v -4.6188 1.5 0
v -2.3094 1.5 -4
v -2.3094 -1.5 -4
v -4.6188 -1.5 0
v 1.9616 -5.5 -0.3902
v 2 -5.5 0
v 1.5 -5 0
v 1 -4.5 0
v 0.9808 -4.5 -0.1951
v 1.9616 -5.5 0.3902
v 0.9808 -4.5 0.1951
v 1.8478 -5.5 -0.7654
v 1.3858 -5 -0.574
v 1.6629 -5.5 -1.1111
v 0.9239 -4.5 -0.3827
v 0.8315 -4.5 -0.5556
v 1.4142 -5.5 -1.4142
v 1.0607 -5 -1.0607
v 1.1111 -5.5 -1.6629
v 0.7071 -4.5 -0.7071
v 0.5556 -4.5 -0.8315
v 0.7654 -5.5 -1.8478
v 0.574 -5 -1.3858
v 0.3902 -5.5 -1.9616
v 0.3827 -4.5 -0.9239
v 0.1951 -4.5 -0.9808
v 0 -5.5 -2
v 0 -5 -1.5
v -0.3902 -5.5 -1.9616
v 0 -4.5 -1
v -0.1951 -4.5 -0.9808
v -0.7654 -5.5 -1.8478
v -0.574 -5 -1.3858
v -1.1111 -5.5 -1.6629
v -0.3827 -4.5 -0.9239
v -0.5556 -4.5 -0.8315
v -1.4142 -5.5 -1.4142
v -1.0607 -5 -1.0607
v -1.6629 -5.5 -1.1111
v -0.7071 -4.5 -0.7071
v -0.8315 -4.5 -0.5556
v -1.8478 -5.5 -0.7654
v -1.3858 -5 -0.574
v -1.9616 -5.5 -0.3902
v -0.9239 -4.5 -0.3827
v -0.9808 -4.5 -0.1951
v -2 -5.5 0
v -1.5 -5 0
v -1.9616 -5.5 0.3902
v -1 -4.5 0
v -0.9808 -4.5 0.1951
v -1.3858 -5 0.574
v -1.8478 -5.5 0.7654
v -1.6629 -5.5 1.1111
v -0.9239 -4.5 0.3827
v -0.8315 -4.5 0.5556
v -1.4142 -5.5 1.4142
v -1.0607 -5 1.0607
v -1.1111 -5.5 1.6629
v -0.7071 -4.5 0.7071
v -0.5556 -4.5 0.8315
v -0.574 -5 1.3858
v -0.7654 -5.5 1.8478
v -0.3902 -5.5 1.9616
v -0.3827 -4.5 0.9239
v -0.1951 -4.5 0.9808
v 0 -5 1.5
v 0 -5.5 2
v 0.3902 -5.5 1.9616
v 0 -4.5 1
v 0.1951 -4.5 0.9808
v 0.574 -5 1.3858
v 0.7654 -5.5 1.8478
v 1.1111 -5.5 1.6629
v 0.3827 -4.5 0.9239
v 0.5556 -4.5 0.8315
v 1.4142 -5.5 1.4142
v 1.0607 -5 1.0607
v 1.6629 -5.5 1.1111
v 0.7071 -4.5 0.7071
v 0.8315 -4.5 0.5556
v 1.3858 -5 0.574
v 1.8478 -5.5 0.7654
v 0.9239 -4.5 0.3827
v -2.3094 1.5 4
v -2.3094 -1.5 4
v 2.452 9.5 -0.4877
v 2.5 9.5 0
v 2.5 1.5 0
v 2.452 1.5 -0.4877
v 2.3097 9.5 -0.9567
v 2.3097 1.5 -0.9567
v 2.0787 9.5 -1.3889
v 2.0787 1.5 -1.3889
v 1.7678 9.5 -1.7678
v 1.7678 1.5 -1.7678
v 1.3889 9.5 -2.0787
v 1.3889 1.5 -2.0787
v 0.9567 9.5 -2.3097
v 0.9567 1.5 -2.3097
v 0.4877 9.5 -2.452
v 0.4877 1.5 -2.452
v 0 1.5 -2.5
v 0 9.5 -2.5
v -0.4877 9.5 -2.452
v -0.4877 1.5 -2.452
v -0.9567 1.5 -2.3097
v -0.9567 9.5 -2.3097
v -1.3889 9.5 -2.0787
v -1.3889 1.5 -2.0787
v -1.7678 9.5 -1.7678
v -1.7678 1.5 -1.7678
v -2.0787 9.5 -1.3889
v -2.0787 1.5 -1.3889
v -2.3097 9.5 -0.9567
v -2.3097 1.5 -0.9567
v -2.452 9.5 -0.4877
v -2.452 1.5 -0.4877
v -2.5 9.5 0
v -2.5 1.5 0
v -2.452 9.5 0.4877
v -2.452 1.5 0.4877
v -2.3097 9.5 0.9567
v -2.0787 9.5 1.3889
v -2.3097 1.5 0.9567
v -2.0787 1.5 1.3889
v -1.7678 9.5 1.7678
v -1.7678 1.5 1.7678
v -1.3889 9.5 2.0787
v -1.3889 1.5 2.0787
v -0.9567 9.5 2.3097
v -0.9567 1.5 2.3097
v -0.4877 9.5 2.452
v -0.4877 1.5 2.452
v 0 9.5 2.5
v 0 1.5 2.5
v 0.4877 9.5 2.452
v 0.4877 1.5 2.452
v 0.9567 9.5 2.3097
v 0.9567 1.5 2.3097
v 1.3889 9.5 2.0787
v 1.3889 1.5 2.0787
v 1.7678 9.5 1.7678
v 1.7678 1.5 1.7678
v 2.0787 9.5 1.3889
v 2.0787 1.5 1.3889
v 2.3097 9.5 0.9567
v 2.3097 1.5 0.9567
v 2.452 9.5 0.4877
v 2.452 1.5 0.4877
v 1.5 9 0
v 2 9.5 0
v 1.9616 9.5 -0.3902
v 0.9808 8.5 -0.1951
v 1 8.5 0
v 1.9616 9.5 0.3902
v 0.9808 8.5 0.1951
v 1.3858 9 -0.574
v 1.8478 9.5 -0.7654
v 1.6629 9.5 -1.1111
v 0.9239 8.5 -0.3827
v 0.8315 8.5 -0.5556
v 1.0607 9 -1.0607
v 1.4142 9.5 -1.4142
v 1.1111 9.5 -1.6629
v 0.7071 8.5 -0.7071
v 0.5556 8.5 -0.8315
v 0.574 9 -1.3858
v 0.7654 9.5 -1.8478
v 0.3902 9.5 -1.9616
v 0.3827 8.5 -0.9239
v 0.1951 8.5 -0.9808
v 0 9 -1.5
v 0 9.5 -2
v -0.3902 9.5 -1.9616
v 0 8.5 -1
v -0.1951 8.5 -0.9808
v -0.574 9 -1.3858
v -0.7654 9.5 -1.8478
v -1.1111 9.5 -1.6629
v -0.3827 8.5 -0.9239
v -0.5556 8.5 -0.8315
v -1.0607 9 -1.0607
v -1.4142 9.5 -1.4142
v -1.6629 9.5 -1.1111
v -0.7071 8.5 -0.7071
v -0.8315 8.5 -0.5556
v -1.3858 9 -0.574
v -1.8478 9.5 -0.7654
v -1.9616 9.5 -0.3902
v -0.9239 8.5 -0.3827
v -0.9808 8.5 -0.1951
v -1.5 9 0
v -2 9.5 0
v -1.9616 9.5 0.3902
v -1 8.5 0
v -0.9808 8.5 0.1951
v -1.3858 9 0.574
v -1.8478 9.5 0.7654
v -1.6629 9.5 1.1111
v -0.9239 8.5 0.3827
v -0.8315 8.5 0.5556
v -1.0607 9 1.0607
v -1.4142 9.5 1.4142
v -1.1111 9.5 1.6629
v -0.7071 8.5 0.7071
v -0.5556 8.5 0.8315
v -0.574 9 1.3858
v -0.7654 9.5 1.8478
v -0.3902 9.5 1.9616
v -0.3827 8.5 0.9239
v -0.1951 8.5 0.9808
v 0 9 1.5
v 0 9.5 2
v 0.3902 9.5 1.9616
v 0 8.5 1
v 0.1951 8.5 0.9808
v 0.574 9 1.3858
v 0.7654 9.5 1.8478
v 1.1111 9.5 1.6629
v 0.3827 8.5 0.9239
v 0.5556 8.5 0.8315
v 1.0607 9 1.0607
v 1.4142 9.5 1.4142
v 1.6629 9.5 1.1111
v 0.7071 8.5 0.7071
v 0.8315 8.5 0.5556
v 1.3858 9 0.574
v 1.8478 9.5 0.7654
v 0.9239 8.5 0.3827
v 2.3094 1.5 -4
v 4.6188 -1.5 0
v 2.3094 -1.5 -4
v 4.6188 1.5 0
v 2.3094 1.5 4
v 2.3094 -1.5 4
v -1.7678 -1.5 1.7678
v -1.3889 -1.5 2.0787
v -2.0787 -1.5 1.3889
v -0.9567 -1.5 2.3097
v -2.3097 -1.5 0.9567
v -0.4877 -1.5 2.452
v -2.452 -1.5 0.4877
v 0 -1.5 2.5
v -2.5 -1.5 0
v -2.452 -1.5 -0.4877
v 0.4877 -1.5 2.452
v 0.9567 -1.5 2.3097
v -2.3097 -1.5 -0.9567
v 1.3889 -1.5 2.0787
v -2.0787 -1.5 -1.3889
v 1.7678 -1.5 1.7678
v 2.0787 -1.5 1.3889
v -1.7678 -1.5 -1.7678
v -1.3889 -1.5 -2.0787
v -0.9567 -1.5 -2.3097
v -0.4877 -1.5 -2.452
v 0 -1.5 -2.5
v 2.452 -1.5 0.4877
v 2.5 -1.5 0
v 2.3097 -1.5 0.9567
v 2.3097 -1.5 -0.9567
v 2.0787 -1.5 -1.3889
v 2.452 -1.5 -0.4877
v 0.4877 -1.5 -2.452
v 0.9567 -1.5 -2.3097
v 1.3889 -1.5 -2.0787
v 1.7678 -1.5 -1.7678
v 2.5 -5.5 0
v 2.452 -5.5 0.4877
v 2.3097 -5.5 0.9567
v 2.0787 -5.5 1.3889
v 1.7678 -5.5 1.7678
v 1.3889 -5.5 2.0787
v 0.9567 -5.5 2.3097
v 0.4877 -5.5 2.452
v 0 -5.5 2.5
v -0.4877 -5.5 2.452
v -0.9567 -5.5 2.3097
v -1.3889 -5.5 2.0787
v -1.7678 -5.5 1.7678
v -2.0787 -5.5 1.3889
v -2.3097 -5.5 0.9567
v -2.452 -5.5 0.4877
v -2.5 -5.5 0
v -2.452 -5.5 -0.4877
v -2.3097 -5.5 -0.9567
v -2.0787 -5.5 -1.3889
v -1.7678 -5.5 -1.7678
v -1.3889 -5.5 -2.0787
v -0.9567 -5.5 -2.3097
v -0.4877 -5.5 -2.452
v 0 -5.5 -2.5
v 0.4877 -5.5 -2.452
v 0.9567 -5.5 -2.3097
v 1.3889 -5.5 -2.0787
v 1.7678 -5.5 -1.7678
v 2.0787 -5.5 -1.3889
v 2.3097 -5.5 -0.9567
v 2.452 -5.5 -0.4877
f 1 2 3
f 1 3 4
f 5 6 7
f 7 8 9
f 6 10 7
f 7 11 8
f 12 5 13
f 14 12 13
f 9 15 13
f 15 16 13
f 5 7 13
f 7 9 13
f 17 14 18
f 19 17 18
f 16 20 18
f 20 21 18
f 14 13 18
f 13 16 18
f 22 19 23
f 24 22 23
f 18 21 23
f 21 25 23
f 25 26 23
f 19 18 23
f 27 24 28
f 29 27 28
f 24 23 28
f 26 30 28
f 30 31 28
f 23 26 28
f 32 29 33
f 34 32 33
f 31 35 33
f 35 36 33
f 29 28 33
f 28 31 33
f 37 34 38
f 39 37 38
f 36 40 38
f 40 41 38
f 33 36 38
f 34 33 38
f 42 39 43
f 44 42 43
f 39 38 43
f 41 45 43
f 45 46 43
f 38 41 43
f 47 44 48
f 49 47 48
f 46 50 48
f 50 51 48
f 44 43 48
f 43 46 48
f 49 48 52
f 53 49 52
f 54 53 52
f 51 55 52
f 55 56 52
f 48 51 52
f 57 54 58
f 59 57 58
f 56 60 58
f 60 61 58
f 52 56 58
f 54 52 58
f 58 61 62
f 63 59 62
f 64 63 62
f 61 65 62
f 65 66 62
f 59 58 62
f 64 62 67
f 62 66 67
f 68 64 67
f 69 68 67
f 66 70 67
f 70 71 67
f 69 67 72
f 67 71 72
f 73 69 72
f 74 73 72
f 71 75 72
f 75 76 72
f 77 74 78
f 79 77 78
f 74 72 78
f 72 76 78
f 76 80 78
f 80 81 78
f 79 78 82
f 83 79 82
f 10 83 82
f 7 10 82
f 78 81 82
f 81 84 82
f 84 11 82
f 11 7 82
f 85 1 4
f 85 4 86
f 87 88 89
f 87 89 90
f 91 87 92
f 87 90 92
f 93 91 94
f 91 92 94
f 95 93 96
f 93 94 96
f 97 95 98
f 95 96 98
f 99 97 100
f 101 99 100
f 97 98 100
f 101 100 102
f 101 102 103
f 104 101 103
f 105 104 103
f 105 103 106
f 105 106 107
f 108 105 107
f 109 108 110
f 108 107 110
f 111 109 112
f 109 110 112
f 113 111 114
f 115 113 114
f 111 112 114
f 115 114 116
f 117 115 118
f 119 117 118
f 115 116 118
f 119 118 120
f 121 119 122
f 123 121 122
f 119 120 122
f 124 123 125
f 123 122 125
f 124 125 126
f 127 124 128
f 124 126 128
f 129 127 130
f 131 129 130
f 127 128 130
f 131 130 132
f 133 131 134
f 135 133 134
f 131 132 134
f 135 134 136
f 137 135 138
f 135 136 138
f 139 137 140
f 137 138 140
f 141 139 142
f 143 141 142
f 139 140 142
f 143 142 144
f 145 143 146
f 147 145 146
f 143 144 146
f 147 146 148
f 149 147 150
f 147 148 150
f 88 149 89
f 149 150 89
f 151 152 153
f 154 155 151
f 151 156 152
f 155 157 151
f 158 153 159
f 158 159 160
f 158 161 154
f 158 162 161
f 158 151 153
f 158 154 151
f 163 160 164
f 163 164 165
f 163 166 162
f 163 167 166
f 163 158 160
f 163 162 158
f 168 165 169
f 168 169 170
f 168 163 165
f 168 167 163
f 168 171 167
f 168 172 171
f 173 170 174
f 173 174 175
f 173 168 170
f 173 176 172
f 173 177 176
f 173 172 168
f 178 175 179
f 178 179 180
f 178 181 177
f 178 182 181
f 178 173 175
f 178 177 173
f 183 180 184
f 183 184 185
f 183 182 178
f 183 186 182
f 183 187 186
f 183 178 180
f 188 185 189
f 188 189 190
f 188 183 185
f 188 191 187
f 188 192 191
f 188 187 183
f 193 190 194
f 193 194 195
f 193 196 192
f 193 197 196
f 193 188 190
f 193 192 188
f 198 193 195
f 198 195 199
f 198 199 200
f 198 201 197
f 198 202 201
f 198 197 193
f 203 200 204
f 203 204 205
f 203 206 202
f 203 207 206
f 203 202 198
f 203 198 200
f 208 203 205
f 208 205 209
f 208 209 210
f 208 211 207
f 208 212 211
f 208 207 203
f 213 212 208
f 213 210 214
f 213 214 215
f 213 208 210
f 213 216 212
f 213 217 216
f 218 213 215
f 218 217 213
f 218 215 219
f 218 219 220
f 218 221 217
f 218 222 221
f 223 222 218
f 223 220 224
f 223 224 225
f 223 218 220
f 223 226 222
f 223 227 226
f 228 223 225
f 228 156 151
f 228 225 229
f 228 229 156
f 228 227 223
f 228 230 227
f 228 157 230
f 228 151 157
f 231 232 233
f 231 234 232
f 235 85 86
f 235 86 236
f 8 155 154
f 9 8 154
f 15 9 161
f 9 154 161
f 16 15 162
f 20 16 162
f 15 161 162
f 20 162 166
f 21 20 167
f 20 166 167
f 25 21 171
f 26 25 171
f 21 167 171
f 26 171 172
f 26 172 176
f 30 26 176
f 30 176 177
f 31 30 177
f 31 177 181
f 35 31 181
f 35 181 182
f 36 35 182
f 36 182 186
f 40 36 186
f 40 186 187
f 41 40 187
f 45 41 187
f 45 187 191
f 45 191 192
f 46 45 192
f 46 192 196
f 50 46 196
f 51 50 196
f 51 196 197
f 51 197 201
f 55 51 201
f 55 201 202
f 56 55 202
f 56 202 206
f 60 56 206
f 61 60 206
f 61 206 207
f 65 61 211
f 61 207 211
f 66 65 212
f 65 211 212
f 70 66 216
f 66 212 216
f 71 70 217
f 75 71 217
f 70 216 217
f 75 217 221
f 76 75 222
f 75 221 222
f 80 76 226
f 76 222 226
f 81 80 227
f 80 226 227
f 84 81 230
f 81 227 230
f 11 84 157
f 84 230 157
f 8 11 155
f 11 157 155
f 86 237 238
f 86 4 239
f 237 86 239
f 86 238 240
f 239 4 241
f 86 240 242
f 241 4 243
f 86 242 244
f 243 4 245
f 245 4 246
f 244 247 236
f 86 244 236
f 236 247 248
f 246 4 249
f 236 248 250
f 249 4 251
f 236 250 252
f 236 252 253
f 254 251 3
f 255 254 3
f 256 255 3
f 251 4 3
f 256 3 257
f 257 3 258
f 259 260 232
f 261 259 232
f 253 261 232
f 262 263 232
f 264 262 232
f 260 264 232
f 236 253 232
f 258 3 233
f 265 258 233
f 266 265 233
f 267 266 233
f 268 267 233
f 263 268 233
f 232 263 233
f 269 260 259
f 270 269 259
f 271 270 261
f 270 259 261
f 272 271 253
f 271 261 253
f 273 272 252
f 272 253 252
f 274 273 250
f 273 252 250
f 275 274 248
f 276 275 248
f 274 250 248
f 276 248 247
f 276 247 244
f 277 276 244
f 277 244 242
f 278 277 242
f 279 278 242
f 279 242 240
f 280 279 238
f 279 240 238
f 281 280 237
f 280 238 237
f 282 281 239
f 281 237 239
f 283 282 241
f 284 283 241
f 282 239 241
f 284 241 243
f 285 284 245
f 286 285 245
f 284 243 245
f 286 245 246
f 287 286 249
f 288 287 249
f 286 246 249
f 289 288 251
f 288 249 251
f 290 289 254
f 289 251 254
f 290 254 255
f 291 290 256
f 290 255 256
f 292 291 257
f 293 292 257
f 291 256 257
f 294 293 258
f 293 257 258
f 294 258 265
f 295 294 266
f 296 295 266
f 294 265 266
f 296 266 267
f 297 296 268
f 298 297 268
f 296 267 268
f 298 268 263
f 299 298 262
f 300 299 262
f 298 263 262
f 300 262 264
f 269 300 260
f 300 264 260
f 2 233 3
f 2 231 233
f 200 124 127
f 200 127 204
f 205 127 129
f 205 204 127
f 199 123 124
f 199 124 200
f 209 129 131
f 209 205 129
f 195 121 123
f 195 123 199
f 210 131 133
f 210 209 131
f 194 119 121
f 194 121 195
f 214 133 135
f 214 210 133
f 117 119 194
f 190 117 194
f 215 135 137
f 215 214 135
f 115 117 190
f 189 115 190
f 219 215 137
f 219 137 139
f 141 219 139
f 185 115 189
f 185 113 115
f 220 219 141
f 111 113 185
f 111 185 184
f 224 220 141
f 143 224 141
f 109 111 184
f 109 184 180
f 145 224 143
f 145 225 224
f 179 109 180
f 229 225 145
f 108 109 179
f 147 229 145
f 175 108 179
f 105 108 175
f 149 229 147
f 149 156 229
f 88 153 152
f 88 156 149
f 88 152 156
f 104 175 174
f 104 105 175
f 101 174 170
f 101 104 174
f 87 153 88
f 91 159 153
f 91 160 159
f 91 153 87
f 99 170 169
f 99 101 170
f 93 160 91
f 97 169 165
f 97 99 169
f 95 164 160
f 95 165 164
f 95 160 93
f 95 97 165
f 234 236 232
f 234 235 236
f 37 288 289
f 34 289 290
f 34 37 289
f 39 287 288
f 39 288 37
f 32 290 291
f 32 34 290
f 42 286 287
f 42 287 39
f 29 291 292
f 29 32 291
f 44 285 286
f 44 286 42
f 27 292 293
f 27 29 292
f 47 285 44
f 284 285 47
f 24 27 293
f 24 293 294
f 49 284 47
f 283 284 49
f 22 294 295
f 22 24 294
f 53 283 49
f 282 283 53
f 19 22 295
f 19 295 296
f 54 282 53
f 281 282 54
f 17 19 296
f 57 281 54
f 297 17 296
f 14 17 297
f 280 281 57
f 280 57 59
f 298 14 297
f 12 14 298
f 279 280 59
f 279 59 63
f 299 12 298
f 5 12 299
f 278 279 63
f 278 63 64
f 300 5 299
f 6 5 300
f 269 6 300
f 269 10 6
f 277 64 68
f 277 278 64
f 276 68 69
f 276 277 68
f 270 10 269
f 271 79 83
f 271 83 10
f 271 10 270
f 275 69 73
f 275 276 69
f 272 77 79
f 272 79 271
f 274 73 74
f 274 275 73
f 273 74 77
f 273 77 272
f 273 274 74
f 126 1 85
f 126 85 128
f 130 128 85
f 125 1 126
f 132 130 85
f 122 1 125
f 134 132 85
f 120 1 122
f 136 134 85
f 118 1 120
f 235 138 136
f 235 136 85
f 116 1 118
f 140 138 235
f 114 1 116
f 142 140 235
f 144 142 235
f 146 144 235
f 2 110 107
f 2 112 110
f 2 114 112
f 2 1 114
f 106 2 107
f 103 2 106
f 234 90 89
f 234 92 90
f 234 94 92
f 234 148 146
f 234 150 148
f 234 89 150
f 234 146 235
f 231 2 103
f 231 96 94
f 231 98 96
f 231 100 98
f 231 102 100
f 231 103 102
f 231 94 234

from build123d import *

# Parameters (mm, degrees)
BOSS_EXTRUDE1_DEPTH = 1.5
SKETCH4_R           = 2.5
BOSS_EXTRUDE3_DEPTH = 4
SKETCH2_R           = 2.5
BOSS_EXTRUDE2_DEPTH = 8
SKETCH3_R           = 1
CUT_EXTRUDE1_DEPTH  = 16
CHAMFER2_SIZE       = 1


with BuildPart() as part:
    # Sketch1 → Boss-Extrude1 (new body, symmetric)
    with BuildSketch(Plane(origin=(0, 0, 0), x_dir=(1, 0, 0), z_dir=(0, 1, 0))):
        Polygon((2.309401077, 4), (-2.309401077, 4), (-4.618802154, 0), (-2.309401077, -4), (2.309401077, -4), (4.618802154, 0), align=None)
    extrude(amount=BOSS_EXTRUDE1_DEPTH, both=True)

    # Sketch4 → Boss-Extrude3 (add)
    with BuildSketch(Plane.XZ.offset(1.5)):
        Circle(SKETCH4_R)
    extrude(amount=BOSS_EXTRUDE3_DEPTH)

    # Sketch2 → Boss-Extrude2 (add)
    with BuildSketch(Plane(origin=(0, 1.5, 0), x_dir=(1, 0, 0), z_dir=(0, 1, 0))):
        Circle(SKETCH2_R)
    extrude(amount=BOSS_EXTRUDE2_DEPTH)

    # Sketch3 → Cut-Extrude1 (cut, through all)
    with BuildSketch(Plane(origin=(0, 9.5, 0), x_dir=(1, 0, 0), z_dir=(0, 1, 0))):
        Circle(SKETCH3_R)
    extrude(amount=-CUT_EXTRUDE1_DEPTH, mode=Mode.SUBTRACT)

    # Chamfer2
    chamfer2_edges = [part.edges().sort_by_distance(p)[0] for p in [
        (-1, -5.5, 0),
        (-1, 9.5, 0),
    ]]
    chamfer(chamfer2_edges, length=CHAMFER2_SIZE)


solid = part.part
